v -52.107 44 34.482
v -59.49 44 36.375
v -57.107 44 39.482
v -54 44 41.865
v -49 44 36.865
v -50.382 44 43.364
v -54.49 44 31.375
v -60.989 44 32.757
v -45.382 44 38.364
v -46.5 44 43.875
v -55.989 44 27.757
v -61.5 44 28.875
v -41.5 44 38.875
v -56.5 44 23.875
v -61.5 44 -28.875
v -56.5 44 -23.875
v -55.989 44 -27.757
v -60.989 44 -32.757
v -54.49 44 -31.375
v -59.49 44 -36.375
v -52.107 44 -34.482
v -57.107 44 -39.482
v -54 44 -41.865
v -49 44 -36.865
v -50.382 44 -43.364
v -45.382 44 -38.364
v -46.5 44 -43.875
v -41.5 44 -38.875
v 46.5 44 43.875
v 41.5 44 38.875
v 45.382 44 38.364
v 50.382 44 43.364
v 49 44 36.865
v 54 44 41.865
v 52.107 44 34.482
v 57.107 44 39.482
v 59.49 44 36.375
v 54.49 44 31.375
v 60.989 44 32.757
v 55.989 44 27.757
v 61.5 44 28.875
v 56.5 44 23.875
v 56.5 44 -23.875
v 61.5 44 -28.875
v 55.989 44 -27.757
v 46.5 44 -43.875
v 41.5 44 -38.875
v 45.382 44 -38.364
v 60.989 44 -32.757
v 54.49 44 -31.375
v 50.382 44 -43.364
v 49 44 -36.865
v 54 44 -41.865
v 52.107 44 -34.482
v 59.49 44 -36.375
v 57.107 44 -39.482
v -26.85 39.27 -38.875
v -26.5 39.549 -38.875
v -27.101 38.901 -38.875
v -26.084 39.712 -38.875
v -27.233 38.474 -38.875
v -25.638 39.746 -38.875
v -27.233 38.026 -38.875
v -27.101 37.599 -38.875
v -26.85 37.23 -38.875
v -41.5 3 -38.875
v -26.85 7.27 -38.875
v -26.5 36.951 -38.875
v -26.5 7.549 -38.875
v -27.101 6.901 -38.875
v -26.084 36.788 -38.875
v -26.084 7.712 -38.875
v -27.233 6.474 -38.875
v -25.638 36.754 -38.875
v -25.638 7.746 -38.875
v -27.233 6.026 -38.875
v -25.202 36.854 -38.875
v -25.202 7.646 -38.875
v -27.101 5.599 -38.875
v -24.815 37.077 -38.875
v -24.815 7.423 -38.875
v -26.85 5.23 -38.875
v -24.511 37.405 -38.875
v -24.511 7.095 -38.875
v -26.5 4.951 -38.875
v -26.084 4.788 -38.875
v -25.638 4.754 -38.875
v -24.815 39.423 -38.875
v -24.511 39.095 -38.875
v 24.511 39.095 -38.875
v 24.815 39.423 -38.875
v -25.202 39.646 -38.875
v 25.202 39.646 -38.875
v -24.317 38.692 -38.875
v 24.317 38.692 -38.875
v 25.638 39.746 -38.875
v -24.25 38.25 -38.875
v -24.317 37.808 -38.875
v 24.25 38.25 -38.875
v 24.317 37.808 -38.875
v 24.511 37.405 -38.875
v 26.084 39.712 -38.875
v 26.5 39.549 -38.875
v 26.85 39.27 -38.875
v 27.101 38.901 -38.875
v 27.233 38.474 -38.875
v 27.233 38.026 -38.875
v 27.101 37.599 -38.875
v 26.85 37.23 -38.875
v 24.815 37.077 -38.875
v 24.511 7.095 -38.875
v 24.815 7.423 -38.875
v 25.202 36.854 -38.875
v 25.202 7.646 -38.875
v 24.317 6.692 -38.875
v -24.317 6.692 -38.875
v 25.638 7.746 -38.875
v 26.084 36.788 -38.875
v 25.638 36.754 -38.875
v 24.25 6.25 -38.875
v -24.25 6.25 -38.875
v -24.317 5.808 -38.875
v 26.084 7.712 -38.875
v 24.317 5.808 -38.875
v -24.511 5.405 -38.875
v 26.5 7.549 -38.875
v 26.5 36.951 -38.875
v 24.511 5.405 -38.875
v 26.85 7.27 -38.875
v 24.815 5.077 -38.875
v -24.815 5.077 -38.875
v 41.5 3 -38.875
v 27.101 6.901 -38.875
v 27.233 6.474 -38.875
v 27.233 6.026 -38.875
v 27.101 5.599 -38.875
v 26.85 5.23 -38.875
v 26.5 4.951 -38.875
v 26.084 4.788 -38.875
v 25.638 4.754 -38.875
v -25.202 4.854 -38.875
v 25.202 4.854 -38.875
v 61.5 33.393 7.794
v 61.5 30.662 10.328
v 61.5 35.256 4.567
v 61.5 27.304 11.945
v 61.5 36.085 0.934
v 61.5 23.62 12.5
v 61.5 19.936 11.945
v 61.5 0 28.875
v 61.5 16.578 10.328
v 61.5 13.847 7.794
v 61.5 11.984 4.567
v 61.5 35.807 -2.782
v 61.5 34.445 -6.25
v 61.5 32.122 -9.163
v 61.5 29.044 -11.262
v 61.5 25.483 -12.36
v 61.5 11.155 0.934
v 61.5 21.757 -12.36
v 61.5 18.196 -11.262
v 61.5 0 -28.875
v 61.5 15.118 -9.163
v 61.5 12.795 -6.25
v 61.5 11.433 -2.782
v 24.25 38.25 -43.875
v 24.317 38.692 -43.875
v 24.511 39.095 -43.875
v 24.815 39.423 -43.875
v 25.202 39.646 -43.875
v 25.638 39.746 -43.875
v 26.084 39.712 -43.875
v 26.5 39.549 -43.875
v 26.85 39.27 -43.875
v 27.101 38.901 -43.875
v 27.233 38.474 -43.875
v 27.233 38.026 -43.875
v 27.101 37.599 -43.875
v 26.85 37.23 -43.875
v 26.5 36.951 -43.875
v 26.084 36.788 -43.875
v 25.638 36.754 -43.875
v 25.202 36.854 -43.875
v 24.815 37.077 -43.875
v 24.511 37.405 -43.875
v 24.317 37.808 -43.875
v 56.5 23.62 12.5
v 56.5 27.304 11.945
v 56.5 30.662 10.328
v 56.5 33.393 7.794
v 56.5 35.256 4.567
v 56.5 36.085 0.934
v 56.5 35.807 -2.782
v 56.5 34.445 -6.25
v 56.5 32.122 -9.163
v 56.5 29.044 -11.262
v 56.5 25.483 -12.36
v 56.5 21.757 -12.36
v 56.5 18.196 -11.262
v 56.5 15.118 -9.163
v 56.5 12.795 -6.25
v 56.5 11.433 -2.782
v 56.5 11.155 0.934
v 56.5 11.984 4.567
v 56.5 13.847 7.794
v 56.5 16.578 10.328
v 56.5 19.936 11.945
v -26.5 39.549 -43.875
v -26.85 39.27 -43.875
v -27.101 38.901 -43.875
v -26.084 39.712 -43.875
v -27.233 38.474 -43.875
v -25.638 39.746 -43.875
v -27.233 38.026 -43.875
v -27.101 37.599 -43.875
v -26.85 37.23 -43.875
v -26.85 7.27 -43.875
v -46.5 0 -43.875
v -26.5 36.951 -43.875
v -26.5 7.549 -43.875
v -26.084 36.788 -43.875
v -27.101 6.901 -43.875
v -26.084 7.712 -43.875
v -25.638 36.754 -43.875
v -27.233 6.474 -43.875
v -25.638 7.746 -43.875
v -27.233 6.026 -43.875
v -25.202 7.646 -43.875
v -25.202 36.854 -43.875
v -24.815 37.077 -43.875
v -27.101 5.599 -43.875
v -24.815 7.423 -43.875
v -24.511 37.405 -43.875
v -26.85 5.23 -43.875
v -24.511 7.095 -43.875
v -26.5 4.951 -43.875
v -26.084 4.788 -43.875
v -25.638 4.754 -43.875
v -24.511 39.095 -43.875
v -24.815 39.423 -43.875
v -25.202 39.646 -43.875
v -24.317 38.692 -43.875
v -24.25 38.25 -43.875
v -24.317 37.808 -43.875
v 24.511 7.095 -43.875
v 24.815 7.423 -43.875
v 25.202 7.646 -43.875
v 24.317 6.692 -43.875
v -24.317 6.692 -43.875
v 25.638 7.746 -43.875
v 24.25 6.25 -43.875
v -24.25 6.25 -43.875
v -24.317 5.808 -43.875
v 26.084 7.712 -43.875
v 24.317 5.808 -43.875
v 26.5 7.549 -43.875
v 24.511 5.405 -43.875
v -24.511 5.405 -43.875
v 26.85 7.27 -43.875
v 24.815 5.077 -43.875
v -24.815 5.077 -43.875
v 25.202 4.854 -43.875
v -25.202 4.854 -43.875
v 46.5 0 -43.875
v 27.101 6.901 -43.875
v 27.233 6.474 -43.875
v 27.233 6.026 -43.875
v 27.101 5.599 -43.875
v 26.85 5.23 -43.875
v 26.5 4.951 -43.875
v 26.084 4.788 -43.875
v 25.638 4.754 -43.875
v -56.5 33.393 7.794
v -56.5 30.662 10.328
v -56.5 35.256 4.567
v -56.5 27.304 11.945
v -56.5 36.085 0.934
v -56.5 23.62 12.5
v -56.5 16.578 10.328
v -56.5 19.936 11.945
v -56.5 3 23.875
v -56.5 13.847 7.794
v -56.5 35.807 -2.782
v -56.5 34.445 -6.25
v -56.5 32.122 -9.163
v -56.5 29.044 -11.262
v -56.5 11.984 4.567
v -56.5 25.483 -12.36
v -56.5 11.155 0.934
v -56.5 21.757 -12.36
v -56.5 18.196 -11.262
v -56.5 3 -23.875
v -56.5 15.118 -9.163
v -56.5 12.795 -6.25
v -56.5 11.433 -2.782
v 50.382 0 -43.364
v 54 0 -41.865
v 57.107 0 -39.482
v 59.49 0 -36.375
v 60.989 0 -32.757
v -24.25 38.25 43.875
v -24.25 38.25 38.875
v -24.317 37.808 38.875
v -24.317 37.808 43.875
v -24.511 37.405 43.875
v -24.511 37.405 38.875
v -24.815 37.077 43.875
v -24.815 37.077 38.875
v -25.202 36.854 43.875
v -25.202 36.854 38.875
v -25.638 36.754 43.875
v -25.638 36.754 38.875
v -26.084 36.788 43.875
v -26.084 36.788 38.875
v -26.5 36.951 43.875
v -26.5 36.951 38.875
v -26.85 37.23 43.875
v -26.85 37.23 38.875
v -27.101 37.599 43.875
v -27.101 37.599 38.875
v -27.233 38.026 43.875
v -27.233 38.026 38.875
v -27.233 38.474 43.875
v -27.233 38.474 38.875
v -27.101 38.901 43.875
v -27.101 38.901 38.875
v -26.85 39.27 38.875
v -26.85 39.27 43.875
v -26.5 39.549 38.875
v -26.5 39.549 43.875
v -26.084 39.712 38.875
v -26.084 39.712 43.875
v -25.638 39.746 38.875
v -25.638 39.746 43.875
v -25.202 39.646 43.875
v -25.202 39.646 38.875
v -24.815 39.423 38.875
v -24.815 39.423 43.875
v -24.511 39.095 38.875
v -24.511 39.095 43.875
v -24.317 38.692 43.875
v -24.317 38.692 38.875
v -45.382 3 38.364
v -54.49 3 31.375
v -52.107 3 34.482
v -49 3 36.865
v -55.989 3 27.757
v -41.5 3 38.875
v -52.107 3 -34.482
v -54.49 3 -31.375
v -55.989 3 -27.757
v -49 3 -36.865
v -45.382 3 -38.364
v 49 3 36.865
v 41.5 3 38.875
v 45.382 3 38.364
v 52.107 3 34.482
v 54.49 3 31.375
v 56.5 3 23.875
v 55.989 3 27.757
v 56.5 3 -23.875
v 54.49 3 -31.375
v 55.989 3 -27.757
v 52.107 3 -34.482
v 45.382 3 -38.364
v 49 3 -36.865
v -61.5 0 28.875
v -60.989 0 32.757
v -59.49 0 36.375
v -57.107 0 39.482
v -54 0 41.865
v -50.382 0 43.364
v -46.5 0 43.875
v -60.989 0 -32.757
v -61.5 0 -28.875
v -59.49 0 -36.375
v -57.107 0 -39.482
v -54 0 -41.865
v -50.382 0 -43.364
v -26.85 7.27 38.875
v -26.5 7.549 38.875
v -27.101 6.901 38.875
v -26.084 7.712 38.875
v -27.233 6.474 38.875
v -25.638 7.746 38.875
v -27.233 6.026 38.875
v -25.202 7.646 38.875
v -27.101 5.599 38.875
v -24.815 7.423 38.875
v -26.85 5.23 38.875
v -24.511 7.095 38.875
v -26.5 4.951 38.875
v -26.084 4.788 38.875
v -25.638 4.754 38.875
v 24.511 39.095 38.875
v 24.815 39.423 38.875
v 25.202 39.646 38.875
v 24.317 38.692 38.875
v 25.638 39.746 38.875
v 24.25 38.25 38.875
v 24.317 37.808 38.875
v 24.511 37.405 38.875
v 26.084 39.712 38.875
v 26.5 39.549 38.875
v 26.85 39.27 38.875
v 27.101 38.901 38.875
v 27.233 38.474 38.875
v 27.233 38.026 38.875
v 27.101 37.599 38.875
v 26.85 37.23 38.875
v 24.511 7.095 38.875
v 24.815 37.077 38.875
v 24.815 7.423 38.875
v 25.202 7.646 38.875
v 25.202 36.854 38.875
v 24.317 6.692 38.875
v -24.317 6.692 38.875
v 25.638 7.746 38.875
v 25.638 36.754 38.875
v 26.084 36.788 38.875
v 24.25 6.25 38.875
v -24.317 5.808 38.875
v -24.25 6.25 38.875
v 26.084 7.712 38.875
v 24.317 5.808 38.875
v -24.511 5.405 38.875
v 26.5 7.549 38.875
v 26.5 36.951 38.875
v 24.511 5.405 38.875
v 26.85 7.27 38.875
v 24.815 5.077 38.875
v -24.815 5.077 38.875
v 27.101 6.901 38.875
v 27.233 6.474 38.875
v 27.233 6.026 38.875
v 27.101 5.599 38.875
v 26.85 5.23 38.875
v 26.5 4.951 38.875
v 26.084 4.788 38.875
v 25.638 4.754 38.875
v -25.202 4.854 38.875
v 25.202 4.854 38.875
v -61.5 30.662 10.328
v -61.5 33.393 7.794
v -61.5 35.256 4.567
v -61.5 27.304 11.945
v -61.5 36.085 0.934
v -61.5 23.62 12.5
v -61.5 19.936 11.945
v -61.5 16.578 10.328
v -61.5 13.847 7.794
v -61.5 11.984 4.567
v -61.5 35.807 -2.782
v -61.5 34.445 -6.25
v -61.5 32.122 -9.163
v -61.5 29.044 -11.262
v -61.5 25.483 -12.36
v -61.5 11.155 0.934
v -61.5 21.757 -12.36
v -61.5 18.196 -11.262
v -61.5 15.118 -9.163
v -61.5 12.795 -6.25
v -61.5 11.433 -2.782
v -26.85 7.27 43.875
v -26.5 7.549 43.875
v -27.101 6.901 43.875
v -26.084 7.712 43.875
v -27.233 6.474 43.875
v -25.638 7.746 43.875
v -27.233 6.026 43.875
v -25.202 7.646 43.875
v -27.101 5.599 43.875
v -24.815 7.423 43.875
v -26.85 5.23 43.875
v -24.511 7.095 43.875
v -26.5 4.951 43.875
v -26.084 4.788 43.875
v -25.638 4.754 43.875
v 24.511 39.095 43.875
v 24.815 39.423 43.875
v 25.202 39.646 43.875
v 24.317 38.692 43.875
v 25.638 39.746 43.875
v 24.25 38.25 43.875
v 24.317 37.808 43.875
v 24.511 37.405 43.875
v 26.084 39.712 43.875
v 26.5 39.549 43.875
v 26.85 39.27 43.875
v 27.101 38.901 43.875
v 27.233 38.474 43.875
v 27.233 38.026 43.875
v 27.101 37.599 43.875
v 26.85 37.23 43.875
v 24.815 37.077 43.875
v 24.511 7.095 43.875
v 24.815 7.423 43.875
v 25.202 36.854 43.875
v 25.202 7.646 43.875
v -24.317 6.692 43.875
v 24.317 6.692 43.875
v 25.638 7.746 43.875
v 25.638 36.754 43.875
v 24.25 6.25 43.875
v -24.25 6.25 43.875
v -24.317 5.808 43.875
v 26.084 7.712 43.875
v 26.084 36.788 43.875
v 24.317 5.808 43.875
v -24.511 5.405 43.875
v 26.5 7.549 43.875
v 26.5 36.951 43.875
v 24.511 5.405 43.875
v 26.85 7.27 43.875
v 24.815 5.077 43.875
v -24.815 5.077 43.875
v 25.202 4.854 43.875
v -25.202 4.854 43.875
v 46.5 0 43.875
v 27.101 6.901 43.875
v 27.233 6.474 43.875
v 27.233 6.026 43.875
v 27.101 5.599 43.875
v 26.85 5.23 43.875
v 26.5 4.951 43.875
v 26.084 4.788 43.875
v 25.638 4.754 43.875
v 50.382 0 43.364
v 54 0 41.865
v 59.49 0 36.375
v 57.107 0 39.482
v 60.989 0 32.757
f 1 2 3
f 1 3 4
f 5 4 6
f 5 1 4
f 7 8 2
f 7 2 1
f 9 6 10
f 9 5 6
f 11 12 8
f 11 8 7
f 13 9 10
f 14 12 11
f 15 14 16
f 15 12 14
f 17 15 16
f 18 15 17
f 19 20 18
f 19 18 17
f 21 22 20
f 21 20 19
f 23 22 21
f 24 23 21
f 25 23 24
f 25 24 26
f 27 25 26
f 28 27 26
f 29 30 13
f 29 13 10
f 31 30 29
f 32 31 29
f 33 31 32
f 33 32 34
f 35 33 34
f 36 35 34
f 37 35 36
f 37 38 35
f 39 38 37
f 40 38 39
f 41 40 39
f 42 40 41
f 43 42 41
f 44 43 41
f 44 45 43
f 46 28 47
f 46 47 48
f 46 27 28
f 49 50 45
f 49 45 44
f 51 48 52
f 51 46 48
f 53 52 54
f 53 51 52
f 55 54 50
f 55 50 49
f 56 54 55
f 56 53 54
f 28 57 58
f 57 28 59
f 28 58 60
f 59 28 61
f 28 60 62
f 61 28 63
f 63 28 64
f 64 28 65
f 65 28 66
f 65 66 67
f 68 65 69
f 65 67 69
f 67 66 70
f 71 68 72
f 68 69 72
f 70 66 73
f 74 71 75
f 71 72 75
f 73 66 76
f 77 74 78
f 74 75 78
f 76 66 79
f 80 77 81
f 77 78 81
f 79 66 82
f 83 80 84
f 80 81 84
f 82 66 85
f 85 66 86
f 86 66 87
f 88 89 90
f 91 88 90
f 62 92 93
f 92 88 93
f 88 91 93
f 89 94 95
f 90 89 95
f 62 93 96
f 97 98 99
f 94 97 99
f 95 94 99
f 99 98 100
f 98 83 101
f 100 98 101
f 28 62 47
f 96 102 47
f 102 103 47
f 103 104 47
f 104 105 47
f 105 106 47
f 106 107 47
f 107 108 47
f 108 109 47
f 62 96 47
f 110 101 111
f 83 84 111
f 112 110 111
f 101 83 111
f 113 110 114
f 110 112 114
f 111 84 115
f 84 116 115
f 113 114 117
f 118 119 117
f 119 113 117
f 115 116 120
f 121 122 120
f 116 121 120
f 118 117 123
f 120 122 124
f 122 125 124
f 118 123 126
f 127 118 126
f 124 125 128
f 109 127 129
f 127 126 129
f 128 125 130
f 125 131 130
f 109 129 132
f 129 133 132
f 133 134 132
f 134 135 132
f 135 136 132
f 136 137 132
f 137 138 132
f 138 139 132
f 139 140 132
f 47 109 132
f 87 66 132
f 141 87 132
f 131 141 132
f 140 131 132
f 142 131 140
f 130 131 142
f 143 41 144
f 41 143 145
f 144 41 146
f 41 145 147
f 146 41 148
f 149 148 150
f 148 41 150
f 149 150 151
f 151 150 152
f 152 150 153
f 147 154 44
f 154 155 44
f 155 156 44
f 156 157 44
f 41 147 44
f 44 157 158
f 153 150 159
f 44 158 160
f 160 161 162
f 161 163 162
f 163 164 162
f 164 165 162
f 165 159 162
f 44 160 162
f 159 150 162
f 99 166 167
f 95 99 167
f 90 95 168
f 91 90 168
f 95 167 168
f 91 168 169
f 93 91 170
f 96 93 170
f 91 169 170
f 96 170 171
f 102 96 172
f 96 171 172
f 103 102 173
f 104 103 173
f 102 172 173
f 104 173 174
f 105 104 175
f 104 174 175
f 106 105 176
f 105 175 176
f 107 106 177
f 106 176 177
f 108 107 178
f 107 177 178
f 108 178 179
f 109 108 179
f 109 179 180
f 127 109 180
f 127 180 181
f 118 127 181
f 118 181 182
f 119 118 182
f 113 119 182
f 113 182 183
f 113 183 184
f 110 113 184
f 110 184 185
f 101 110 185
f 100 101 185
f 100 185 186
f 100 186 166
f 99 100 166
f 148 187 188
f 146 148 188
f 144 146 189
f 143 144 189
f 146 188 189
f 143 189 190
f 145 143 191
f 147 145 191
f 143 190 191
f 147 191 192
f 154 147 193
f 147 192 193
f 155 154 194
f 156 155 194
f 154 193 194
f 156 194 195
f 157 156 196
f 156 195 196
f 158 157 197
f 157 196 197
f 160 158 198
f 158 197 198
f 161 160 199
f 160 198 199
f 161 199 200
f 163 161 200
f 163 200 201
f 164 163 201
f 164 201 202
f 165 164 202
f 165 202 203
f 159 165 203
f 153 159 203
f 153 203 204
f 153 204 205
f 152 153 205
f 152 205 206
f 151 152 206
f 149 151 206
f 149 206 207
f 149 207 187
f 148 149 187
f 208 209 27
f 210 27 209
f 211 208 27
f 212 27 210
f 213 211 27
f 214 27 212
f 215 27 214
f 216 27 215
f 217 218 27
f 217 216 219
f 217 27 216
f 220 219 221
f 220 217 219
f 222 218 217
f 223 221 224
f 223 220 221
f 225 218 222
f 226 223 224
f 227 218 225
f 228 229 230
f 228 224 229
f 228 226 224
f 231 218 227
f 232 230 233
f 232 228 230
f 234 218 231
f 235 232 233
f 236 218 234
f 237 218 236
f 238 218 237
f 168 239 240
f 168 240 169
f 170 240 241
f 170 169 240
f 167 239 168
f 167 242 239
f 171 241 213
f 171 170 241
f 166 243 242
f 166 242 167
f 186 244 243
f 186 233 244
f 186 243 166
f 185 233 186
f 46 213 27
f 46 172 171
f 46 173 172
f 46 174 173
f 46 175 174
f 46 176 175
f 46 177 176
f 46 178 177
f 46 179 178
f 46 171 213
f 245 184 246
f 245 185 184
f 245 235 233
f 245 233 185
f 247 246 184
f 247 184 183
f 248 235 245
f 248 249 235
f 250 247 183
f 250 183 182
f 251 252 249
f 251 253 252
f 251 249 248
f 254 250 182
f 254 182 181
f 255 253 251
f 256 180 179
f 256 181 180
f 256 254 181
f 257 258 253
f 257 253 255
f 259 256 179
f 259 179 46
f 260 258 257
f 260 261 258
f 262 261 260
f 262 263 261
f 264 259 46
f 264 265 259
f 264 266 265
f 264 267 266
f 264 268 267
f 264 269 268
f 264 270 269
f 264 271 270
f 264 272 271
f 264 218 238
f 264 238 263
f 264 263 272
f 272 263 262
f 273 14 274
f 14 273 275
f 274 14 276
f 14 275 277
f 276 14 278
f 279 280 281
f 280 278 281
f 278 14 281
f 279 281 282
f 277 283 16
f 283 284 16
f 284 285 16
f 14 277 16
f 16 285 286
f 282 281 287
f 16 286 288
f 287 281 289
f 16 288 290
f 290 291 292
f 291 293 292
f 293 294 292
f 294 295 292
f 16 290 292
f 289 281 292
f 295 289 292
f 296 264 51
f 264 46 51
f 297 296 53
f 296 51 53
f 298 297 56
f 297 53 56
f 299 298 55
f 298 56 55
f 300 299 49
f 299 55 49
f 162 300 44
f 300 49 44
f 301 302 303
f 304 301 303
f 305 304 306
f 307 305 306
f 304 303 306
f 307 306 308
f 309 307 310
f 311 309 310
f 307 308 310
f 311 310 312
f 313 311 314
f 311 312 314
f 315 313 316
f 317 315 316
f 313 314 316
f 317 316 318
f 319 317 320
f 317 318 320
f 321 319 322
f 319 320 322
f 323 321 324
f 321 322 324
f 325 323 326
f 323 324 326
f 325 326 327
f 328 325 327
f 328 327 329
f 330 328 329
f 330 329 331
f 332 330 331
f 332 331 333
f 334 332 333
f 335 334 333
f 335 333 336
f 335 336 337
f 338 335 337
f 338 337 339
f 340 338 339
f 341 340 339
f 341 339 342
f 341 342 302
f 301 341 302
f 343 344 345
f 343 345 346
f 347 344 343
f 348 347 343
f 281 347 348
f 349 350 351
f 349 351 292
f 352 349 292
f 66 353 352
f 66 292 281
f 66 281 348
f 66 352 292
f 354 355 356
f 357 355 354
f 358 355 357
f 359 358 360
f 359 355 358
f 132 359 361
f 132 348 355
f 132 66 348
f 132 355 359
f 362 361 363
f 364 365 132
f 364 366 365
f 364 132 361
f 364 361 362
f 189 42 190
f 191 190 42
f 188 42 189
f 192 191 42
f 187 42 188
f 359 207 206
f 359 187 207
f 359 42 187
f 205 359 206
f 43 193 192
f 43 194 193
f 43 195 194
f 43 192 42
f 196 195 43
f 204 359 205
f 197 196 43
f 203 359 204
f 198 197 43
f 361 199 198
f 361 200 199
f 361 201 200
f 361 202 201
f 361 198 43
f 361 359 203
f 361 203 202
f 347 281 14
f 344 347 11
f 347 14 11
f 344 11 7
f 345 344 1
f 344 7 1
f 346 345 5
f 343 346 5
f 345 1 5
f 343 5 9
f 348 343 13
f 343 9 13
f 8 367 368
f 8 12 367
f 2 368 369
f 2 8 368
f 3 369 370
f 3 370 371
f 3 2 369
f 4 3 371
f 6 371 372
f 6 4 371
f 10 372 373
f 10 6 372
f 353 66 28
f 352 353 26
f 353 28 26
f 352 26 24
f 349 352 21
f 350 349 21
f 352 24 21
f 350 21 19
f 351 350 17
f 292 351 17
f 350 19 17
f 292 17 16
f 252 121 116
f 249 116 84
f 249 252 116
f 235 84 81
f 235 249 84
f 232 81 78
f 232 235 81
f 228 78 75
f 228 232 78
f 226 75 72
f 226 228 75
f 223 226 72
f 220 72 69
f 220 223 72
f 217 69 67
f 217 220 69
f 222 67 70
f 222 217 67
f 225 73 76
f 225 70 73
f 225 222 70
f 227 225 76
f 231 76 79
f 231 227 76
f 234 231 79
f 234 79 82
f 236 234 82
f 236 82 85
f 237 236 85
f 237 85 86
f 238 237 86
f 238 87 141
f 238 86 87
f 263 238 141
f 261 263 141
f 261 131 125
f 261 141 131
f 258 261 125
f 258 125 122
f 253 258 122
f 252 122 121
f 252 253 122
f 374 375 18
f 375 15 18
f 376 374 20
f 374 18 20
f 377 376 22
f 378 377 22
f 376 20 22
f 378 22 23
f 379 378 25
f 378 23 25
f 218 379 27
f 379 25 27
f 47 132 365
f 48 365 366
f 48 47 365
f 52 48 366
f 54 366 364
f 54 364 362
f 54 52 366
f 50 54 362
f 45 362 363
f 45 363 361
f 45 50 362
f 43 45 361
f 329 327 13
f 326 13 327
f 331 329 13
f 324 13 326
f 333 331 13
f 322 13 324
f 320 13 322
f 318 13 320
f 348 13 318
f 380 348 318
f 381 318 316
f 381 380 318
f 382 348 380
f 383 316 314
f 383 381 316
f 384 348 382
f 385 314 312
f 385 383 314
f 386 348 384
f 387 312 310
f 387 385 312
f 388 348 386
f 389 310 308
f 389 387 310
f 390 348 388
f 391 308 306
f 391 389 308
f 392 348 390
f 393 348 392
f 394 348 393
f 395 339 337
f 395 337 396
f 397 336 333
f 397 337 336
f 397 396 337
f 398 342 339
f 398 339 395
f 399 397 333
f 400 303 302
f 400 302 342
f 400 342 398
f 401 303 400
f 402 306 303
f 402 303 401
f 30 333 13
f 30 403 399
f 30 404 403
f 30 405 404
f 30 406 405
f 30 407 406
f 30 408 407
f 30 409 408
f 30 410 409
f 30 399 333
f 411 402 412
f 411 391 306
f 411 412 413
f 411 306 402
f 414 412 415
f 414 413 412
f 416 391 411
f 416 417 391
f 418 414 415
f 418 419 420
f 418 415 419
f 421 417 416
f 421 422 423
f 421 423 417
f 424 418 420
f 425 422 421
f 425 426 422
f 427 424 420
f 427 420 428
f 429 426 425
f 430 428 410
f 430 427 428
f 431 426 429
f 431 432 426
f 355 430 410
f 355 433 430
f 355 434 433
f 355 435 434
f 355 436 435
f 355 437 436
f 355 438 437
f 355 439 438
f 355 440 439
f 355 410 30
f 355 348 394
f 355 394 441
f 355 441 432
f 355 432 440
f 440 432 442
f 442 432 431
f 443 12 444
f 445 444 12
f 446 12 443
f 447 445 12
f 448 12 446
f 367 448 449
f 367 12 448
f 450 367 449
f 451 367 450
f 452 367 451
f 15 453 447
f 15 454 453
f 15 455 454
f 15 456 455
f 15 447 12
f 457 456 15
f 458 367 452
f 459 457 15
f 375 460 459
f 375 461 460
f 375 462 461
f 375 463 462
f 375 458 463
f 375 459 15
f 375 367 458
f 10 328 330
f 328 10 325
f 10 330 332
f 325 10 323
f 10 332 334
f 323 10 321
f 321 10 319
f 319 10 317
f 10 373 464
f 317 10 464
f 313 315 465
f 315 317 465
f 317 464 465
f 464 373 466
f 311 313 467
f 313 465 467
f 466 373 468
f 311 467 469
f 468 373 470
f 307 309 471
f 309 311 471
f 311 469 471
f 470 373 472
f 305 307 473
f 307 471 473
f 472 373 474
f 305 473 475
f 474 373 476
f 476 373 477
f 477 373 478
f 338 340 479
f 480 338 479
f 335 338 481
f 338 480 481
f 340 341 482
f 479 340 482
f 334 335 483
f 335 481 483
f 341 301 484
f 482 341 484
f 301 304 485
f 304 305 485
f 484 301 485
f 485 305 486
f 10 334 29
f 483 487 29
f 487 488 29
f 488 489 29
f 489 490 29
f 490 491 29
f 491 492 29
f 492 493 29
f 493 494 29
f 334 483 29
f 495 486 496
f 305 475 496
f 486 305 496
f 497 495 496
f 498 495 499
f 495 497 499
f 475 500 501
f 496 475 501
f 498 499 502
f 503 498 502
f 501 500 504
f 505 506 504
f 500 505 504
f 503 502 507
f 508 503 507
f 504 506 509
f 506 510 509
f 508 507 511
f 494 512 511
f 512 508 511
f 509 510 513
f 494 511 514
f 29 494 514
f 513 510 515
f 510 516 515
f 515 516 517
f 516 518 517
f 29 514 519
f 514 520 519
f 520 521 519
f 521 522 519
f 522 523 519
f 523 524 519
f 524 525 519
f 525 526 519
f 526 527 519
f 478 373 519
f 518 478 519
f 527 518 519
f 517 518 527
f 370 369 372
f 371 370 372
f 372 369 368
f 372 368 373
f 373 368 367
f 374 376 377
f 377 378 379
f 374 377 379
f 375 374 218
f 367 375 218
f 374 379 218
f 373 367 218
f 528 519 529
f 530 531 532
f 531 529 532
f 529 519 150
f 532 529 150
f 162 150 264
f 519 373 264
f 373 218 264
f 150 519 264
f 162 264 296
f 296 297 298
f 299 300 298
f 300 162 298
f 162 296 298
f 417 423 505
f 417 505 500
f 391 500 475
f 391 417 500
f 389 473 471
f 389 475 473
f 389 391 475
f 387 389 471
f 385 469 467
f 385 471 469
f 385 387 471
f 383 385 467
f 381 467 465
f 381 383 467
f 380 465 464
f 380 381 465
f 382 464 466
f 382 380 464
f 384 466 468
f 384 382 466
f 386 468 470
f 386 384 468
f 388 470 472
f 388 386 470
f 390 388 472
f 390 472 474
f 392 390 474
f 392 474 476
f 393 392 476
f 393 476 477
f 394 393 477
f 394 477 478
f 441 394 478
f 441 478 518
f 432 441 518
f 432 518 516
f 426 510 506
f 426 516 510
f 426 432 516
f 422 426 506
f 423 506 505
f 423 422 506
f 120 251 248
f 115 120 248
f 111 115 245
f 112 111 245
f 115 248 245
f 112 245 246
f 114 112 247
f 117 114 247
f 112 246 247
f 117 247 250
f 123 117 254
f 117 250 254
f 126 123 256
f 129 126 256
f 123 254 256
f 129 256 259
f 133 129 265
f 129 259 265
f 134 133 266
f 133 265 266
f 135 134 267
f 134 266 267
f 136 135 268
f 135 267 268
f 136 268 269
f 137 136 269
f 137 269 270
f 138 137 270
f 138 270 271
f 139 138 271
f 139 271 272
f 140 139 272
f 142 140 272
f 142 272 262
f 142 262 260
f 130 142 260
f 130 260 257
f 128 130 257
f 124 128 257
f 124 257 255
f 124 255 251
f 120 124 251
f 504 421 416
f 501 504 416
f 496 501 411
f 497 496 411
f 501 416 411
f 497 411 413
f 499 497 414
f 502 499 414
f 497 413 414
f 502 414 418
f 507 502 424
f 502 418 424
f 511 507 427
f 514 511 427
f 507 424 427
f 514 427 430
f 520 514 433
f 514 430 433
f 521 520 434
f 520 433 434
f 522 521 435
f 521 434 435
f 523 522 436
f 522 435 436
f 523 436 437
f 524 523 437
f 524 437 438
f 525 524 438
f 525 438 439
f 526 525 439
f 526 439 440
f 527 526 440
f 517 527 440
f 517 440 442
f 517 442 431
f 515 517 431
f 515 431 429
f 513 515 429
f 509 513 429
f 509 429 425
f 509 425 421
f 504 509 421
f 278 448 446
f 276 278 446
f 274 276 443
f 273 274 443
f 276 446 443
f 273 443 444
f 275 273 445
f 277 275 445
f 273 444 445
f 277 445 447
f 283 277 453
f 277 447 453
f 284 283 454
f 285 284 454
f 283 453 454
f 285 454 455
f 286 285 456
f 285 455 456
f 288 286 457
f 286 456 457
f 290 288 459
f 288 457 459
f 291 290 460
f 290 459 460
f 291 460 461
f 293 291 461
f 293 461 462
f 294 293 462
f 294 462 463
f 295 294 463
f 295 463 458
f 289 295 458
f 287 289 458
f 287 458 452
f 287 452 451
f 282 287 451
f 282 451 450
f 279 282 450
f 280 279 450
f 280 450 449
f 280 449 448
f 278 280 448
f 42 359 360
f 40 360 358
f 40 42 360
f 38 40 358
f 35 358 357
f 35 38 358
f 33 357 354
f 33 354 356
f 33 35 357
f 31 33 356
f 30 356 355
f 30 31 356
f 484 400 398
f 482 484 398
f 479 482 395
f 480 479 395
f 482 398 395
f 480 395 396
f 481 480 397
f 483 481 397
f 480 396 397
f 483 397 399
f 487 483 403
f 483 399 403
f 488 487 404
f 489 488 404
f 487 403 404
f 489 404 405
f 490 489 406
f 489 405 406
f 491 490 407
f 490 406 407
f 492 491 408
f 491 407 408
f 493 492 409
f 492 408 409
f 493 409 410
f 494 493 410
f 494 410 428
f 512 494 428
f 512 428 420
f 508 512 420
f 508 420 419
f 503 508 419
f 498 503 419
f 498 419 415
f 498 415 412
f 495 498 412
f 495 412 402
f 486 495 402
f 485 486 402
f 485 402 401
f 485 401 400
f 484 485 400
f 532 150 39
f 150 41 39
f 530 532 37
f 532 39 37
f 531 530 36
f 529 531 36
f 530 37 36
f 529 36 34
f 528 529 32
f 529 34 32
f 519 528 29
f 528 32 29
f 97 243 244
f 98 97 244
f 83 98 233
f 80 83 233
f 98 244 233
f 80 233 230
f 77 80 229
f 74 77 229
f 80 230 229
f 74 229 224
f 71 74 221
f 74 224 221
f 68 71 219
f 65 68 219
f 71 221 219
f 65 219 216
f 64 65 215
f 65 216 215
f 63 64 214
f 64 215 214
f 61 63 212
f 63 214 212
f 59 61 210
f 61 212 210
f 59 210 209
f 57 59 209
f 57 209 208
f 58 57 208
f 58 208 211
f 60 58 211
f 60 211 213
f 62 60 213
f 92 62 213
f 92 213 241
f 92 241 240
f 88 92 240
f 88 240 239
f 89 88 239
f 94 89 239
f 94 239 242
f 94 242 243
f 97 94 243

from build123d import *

# Parameters (mm, degrees)
SKETCH1_W                 = 123
SKETCH1_H                 = 87.75
SKETCH1_W_2               = 113
SKETCH1_H_2               = 77.75
BOSS_EXTRUDE1_DEPTH       = 44
SKETCH1_3_W               = 113
SKETCH1_3_H               = 77.75
BOSS_EXTRUDE2_DEPTH       = 3
FILLET1_R                 = 15
FILLET2_R                 = 15
FILLET3_R                 = 15
FILLET4_R                 = 15
FILLET5_R                 = 15
FILLET6_R                 = 15
FILLET7_R                 = 15
FILLET8_R                 = 15
SKETCH2_R                 = 1.5
CUT_EXTRUDE1_DEPTH        = 116.837439975
LPATTERN2_COPY_1_SKETCH_R = 1.5
LPATTERN2_COPY_1_DEPTH    = 116.837439975
LPATTERN2_COPY_2_SKETCH_R = 1.5
LPATTERN2_COPY_2_DEPTH    = 116.837439975
CUT_EXTRUDE2_DEPTH        = 138.804265627


with BuildPart() as part:
    # Sketch1 → Boss-Extrude1 (new body)
    with BuildSketch(Plane(origin=(0, 0, 0), x_dir=(1, 0, 0), z_dir=(0, 1, 0))):
        Rectangle(SKETCH1_W, SKETCH1_H)
        Rectangle(SKETCH1_W_2, SKETCH1_H_2, mode=Mode.SUBTRACT)
    extrude(amount=BOSS_EXTRUDE1_DEPTH)

    # Sketch1<3> → Boss-Extrude2 (add)
    with BuildSketch(Plane(origin=(0, 0, 0), x_dir=(1, 0, 0), z_dir=(0, 1, 0))):
        Rectangle(SKETCH1_3_W, SKETCH1_3_H)
    extrude(amount=BOSS_EXTRUDE2_DEPTH)

    # Fillet1
    fillet1_edges = [part.edges().sort_by_distance(p)[0] for p in [
        (-61.5, 22, 43.875),
    ]]
    fillet(fillet1_edges, radius=FILLET1_R)

    # Fillet2
    fillet2_edges = [part.edges().sort_by_distance(p)[0] for p in [
        (-61.5, 22, -43.875),
    ]]
    fillet(fillet2_edges, radius=FILLET2_R)

    # Fillet3
    fillet3_edges = [part.edges().sort_by_distance(p)[0] for p in [
        (61.5, 22, -43.875),
    ]]
    fillet(fillet3_edges, radius=FILLET3_R)

    # Fillet4
    fillet4_edges = [part.edges().sort_by_distance(p)[0] for p in [
        (61.5, 22, 43.875),
    ]]
    fillet(fillet4_edges, radius=FILLET4_R)

    # Fillet5
    fillet5_edges = [part.edges().sort_by_distance(p)[0] for p in [
        (-56.5, 23.5, -38.875),
    ]]
    fillet(fillet5_edges, radius=FILLET5_R)

    # Fillet6
    fillet6_edges = [part.edges().sort_by_distance(p)[0] for p in [
        (-56.5, 23.5, 38.875),
    ]]
    fillet(fillet6_edges, radius=FILLET6_R)

    # Fillet7
    fillet7_edges = [part.edges().sort_by_distance(p)[0] for p in [
        (56.5, 23.5, -38.875),
    ]]
    fillet(fillet7_edges, radius=FILLET7_R)

    # Fillet8
    fillet8_edges = [part.edges().sort_by_distance(p)[0] for p in [
        (56.5, 23.5, 38.875),
    ]]
    fillet(fillet8_edges, radius=FILLET8_R)

    # Sketch2 → Cut-Extrude1 (cut, through all)
    with BuildSketch(Plane(origin=(0, 0, -43.875), x_dir=(-1, 0, 0), z_dir=(0, 0, -1))):
        with Locations((-25.75, 6.25)):
            Circle(SKETCH2_R)
    cut_extrude1 = extrude(amount=-CUT_EXTRUDE1_DEPTH, mode=Mode.SUBTRACT)

    # Mirror1: Cut-Extrude1 across plane
    add(cut_extrude1.mirror(Plane(origin=(0, 0, 0), x_dir=(0, 0, 1), z_dir=(1, 0, 0))), mode=Mode.SUBTRACT)

    # LPattern2 copy 1 sketch → LPattern2 copy 1 (cut, through all)
    with BuildSketch(Plane(origin=(0, 32, -43.875), x_dir=(1, 0, 0), z_dir=(0, 0, -1))):
        with Locations((-25.75, -6.25)):
            Circle(LPATTERN2_COPY_1_SKETCH_R)
    extrude(amount=-LPATTERN2_COPY_1_DEPTH, mode=Mode.SUBTRACT)

    # LPattern2 copy 2 sketch → LPattern2 copy 2 (cut, through all)
    with BuildSketch(Plane(origin=(0, 32, -43.875), x_dir=(-1, 0, 0), z_dir=(0, 0, -1))):
        with Locations((-25.75, 6.25)):
            Circle(LPATTERN2_COPY_2_SKETCH_R)
    extrude(amount=-LPATTERN2_COPY_2_DEPTH, mode=Mode.SUBTRACT)

    # Sketch3 → Cut-Extrude2 (cut, through all)
    with BuildSketch(Plane.ZY.offset(61.5)):
        with BuildLine():
            ThreePointArc((0, 36.12), (-8.838834765, 14.781165235), (12.5, 23.62))
            ThreePointArc((12.5, 23.62), (8.838834765, 32.458834765), (0, 36.12))
        make_face()
    extrude(amount=-CUT_EXTRUDE2_DEPTH, mode=Mode.SUBTRACT)


solid = part.part
